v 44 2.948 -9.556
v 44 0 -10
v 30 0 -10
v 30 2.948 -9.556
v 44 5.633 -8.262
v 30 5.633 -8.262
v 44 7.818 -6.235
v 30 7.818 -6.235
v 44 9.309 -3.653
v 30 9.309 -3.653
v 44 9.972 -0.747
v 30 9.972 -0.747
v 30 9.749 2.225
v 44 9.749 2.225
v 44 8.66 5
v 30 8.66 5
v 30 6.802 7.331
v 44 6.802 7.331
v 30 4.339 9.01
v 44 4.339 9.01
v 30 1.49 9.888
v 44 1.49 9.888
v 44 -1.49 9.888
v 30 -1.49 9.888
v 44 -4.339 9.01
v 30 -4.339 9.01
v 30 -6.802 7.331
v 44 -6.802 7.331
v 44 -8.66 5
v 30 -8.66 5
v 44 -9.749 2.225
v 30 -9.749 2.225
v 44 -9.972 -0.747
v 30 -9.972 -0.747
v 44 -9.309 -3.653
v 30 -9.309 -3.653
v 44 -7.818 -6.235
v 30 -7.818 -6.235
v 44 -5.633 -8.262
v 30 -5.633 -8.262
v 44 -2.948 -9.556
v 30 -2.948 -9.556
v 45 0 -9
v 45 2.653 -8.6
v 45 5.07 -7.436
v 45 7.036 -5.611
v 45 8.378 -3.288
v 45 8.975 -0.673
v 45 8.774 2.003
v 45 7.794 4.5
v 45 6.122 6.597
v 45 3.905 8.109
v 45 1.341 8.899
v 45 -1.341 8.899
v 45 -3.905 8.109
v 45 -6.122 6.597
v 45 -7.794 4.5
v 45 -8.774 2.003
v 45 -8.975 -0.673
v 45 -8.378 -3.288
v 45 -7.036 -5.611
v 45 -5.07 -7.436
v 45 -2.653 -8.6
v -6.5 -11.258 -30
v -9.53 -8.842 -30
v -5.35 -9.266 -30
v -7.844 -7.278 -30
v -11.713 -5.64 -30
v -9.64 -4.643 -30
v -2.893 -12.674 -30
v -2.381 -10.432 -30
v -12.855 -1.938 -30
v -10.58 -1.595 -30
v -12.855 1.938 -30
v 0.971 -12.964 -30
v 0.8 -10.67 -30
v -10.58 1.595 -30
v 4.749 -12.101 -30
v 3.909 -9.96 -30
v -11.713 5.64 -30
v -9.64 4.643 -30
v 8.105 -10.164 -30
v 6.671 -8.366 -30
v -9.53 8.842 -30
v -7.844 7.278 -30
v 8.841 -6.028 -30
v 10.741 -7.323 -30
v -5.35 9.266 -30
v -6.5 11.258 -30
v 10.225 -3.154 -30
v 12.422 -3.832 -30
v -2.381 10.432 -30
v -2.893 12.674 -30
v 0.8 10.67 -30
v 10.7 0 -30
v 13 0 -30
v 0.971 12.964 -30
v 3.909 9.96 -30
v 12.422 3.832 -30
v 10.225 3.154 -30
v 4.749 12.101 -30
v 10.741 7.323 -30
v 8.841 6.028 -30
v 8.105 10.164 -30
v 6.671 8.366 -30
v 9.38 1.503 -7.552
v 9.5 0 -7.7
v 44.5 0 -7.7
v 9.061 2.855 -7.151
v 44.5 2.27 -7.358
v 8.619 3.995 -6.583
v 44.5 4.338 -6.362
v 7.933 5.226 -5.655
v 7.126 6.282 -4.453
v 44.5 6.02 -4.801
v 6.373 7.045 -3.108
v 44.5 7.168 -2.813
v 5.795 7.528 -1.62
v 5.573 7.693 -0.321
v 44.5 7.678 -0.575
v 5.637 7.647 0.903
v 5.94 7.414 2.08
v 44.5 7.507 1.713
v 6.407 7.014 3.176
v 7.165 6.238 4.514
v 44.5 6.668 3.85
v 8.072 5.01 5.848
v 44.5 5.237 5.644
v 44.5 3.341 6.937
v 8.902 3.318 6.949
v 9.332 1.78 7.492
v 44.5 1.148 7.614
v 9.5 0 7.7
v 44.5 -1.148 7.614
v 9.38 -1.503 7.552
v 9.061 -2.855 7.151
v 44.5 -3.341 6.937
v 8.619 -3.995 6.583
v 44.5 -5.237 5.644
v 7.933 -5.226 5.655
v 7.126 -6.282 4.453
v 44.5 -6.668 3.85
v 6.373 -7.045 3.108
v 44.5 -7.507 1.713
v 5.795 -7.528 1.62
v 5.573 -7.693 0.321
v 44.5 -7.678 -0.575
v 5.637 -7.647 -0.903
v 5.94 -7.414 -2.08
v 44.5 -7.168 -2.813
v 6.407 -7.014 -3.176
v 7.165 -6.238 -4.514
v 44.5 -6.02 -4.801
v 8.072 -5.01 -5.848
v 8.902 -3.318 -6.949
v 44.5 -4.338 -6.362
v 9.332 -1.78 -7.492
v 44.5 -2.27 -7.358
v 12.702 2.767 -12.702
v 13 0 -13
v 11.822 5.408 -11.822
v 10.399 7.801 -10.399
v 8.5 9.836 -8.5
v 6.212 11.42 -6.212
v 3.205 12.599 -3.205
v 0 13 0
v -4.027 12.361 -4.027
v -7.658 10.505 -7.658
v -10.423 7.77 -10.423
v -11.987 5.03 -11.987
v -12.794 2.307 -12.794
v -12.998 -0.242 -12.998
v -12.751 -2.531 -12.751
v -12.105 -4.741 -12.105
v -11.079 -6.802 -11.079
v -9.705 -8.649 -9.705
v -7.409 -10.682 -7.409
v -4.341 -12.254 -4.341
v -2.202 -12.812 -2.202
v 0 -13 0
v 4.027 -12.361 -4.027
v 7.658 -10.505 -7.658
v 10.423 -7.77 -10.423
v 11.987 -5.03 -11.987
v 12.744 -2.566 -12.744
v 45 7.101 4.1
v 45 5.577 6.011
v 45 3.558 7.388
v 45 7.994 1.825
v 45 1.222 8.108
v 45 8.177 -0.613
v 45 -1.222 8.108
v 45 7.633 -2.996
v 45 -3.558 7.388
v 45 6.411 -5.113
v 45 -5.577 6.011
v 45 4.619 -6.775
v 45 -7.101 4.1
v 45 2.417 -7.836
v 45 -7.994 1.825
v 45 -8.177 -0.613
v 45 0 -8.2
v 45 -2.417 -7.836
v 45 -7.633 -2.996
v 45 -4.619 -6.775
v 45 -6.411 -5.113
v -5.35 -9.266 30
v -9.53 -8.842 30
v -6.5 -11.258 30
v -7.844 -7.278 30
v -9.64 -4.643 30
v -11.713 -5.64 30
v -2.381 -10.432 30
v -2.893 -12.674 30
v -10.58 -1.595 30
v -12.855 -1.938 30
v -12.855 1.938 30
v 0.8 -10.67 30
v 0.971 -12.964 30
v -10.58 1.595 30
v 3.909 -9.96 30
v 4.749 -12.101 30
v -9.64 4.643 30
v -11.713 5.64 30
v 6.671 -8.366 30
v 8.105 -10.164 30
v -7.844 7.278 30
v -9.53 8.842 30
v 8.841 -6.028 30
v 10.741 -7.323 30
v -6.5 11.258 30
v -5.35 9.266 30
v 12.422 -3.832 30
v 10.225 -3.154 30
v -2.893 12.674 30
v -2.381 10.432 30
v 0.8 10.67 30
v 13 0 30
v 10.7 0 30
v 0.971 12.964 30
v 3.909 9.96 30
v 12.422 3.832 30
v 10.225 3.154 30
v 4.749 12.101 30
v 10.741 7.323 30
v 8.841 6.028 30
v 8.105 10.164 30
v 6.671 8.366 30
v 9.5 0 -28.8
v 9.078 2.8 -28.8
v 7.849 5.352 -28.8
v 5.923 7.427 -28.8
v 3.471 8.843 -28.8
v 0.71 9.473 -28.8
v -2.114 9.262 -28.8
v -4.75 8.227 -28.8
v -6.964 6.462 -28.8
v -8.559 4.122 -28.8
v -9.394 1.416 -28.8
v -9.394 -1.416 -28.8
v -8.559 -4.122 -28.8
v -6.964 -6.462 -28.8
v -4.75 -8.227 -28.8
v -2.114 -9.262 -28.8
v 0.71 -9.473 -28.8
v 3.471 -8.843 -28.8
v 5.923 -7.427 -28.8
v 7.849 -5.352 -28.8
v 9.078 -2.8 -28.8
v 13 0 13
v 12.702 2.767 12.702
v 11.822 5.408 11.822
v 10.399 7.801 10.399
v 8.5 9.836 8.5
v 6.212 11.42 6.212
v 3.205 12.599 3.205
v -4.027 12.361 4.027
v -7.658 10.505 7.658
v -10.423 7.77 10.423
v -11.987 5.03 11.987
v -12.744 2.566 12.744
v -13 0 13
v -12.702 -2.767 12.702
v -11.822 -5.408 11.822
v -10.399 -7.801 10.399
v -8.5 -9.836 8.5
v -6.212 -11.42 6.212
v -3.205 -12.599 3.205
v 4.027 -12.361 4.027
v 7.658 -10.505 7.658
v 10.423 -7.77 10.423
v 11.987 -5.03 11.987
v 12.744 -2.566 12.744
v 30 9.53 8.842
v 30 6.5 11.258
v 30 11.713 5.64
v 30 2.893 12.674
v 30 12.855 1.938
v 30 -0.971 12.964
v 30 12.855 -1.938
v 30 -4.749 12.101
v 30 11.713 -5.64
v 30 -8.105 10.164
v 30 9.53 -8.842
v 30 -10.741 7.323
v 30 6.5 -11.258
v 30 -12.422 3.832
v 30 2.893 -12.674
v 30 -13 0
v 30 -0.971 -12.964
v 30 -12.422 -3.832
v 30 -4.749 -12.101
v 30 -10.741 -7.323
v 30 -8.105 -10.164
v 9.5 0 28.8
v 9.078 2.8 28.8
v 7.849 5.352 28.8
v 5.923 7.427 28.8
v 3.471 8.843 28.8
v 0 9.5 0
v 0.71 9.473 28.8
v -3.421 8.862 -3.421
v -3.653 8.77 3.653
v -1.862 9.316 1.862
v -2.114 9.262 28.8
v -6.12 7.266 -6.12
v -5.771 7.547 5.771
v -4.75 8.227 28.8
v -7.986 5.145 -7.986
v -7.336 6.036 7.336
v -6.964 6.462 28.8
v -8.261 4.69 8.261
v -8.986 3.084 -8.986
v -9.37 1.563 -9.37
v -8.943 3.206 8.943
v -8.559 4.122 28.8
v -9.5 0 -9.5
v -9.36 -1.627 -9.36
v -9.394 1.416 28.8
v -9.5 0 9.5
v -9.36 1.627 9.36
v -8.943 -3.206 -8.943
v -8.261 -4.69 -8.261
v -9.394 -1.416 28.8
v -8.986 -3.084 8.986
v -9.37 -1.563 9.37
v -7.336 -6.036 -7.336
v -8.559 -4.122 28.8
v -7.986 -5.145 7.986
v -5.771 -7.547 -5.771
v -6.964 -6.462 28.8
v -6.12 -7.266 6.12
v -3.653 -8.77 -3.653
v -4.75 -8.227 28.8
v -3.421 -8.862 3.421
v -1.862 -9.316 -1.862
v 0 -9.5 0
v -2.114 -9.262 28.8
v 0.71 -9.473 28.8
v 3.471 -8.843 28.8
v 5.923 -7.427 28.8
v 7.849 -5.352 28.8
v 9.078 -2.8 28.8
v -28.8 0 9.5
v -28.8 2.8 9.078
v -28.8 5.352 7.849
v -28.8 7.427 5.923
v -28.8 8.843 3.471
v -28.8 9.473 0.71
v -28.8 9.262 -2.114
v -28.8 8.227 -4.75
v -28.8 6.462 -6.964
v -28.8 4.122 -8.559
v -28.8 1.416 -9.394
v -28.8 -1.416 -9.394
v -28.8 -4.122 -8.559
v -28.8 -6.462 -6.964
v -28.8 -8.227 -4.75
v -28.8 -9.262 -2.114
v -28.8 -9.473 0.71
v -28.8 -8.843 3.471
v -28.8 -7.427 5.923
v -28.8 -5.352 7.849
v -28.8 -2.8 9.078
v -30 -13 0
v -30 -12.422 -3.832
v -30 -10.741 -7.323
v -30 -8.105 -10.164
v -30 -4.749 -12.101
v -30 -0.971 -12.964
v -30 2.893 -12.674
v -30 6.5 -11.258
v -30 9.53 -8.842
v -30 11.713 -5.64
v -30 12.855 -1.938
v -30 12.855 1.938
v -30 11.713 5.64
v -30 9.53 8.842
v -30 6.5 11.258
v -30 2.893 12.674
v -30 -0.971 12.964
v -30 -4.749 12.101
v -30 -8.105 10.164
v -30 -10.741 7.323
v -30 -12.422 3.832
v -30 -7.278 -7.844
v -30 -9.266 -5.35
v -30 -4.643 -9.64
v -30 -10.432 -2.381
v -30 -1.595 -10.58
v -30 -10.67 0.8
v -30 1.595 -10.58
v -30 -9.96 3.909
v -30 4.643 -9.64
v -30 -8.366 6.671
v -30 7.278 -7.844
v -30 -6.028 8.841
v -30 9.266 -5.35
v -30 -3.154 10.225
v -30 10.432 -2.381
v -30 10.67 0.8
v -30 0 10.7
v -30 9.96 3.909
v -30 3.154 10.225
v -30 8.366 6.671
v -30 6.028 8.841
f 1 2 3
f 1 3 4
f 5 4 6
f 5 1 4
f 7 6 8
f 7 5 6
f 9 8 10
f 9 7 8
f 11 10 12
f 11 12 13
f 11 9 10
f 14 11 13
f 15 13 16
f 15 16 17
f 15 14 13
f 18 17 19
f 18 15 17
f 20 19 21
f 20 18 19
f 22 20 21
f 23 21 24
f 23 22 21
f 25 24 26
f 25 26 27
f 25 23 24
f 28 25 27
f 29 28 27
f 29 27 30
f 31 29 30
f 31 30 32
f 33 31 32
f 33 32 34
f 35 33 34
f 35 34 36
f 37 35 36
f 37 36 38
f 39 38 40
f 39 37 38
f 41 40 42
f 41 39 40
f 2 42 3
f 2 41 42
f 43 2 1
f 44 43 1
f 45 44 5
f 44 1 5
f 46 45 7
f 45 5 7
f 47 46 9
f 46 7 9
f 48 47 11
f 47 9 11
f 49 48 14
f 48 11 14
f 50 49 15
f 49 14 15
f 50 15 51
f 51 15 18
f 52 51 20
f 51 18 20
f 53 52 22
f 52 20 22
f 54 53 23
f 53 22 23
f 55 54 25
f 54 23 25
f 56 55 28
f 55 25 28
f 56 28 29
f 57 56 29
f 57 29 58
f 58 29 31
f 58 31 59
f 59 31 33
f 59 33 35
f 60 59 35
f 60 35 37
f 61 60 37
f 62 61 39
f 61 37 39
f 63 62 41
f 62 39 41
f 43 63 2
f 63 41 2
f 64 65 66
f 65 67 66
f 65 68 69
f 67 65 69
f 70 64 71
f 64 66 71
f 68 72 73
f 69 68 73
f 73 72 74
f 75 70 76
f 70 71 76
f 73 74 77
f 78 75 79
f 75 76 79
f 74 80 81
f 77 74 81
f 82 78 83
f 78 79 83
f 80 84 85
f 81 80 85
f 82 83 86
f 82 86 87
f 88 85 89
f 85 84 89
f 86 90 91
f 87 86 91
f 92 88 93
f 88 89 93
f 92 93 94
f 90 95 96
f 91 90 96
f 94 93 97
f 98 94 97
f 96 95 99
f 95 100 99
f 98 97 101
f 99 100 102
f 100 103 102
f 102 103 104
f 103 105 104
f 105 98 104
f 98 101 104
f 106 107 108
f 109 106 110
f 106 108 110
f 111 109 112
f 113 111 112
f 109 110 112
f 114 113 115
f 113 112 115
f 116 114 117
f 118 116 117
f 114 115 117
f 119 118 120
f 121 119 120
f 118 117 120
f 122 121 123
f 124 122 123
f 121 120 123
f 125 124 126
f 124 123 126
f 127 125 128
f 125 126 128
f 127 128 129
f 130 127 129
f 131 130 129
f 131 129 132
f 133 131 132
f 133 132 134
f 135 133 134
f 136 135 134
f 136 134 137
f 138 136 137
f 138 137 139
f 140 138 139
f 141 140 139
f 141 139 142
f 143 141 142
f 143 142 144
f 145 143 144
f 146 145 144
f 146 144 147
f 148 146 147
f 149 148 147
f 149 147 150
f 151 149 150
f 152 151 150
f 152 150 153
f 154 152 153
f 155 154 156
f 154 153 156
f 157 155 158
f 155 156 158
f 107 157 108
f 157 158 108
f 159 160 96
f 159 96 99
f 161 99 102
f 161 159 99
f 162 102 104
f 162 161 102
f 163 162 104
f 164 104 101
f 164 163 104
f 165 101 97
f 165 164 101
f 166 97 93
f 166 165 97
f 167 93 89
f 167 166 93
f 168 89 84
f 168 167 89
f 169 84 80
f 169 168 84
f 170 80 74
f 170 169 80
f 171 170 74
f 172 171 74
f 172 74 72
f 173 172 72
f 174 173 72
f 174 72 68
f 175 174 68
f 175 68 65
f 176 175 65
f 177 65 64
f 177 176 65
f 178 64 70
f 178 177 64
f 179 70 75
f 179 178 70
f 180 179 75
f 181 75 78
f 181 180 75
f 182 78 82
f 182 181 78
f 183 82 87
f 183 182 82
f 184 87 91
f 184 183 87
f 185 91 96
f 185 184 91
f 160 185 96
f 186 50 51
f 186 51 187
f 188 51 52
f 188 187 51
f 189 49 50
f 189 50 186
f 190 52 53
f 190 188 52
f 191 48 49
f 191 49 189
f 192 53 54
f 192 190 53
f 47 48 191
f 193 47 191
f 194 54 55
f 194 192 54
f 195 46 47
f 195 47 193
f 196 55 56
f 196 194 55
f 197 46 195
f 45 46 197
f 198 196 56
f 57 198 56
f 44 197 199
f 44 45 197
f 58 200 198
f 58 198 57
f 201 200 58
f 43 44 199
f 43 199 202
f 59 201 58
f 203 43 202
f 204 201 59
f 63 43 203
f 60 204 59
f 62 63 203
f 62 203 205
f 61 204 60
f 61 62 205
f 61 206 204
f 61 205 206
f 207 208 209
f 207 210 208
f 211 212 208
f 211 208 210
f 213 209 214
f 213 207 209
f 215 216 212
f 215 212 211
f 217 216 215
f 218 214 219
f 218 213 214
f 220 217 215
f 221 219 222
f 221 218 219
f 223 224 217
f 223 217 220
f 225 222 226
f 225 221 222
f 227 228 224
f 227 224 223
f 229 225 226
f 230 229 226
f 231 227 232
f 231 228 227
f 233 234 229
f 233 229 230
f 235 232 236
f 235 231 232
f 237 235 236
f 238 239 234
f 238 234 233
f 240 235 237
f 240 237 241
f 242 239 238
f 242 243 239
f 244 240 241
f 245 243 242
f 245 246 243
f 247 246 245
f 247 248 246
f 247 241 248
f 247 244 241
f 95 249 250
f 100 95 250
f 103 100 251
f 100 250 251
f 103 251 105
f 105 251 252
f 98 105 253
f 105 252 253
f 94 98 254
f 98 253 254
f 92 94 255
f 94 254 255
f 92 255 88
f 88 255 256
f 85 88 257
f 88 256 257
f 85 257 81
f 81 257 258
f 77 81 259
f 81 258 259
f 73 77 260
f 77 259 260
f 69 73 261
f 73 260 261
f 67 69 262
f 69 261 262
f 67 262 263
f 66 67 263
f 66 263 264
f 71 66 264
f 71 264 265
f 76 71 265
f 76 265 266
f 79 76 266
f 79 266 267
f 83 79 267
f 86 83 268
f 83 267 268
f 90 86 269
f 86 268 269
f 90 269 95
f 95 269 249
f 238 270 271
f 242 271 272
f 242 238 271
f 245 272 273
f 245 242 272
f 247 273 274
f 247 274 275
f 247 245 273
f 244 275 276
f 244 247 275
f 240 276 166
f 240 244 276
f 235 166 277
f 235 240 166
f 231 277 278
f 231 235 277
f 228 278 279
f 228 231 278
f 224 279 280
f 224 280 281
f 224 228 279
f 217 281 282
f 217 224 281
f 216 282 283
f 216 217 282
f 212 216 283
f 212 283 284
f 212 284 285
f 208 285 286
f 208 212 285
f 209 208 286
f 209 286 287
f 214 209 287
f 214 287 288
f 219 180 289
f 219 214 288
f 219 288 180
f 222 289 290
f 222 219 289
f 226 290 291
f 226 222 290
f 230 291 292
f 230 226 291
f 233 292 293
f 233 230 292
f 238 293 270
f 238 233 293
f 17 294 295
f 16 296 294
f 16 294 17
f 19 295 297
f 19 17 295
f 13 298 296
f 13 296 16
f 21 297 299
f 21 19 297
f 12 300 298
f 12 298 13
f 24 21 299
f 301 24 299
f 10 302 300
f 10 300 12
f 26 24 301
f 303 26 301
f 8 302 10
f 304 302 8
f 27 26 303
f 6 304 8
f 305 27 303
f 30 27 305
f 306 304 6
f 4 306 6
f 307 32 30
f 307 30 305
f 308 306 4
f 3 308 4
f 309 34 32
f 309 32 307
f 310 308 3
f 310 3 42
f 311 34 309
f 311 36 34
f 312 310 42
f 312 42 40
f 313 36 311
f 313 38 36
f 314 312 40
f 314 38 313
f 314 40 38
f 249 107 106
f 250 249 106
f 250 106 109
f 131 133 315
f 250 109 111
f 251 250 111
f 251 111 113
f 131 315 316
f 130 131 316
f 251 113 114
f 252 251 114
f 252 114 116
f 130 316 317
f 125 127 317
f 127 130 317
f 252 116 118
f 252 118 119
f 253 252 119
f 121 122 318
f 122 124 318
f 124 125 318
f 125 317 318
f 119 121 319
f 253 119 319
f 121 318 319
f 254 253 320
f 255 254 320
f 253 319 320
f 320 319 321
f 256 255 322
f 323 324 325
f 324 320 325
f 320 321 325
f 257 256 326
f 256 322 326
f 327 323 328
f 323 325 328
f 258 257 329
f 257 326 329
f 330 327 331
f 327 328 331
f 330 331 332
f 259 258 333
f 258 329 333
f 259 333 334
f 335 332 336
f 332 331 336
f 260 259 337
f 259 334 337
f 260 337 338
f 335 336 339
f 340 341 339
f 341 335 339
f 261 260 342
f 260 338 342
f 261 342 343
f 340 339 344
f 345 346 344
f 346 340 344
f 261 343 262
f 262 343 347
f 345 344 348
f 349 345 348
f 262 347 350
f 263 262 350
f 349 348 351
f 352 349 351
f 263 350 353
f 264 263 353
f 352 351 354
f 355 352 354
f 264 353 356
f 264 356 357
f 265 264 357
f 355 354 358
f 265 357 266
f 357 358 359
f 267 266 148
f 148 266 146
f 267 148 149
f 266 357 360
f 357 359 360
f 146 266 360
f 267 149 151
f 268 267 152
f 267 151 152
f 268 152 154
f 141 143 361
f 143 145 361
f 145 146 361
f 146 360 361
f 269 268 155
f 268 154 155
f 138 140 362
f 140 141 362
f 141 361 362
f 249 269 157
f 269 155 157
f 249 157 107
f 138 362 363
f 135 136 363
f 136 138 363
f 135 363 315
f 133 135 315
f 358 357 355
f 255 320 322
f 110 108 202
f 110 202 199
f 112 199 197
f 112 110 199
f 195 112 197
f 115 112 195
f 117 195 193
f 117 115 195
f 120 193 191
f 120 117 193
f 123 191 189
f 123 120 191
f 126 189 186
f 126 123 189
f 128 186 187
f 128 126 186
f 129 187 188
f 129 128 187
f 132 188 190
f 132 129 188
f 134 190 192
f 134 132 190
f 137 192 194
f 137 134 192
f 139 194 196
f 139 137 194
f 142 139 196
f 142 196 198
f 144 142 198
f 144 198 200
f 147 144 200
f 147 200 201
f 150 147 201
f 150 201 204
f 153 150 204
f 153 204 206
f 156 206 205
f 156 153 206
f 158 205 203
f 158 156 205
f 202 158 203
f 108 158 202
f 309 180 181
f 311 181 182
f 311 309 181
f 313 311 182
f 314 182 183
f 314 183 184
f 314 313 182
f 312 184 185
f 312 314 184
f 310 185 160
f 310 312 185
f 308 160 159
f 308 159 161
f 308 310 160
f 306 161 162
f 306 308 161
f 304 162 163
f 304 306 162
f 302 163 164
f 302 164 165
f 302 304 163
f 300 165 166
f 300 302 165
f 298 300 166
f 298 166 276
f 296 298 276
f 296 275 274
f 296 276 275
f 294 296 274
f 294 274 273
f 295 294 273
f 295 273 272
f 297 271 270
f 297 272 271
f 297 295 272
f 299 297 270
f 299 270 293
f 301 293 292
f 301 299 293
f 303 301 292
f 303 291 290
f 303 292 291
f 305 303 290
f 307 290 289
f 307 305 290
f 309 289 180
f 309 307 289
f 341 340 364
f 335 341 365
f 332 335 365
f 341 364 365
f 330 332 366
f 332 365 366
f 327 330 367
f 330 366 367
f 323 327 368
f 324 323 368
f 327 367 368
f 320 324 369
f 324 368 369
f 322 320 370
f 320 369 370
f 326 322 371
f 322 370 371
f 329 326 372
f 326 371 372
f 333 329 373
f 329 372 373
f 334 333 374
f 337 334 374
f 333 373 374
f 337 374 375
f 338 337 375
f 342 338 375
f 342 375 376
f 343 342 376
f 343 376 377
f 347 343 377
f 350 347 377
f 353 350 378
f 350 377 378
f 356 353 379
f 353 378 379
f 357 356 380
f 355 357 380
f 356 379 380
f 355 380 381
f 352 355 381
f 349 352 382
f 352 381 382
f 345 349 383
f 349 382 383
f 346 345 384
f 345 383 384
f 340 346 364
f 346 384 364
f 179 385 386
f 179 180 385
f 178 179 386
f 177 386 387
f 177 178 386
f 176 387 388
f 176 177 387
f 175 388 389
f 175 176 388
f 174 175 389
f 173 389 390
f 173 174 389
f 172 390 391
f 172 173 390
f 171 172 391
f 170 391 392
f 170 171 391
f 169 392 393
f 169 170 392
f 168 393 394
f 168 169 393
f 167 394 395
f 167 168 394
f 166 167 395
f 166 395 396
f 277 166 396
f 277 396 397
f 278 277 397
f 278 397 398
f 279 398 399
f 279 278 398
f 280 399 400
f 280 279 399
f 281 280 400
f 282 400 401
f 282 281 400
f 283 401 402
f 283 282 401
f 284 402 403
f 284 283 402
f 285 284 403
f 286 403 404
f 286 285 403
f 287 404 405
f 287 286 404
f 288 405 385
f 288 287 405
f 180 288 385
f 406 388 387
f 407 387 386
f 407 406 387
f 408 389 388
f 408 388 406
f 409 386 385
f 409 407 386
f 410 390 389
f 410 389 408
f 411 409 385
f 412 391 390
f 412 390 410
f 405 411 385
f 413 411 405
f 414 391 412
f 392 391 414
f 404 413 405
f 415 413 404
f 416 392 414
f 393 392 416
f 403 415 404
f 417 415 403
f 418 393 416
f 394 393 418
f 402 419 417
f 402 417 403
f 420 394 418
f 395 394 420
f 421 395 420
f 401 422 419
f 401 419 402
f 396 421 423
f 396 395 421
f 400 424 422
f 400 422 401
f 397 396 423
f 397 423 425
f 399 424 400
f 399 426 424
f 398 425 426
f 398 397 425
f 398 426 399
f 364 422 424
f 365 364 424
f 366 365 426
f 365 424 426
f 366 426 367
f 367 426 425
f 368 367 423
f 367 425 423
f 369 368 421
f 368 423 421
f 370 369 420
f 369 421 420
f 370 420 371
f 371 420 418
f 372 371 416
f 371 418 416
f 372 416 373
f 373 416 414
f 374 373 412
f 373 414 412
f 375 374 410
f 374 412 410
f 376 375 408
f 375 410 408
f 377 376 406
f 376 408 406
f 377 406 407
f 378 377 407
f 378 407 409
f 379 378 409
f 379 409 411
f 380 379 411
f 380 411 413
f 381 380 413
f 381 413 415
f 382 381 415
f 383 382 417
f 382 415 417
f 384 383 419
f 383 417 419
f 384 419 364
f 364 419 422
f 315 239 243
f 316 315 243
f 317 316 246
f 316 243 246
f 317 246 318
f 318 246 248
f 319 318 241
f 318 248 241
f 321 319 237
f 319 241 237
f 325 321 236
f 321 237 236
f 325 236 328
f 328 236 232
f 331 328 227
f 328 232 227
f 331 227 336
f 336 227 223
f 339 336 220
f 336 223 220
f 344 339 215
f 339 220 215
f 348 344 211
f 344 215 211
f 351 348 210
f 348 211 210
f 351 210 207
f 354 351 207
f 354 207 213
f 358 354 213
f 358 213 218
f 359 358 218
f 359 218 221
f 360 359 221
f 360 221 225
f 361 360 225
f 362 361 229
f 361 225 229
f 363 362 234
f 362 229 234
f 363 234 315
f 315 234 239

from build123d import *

# Parameters (mm, degrees)
SKETCH_1_R               = 13
EXTRUDE_1_DEPTH          = 30
SKETCH_2_R               = 13
EXTRUDE_2_DEPTH          = 45
SKETCH_3_R               = 13
SKETCH_3_R_2             = 10
CUT_EXTRUDE_1_DEPTH      = 15
SKETCH_4_R               = 9.5
CUT_EXTRUDE_2_DEPTH      = 90
CUT_EXTRUDE_3_REACH      = 97.755
CUT_EXTRUDE_3_END_RADIUS = 9.5
SKETCH_5_R               = 7.7
CUT_EXTRUDE_4_REACH      = 97.755
CUT_EXTRUDE_4_END_RADIUS = 9.5
SKETCH_6_R               = 9.5
CUT_EXTRUDE_START        = -15
SKETCH_7_R               = 13
CUT_EXTRUDE_5_DEPTH      = 15
CHAMFER_1_SIZE           = 1.2
CHAMFER_2_SIZE           = 1
CHAMFER_3_SIZE           = 0.5


with BuildPart() as part:
    # 草图1 → 拉伸1 (new, symmetric)
    with BuildSketch(Plane.XY):
        Circle(SKETCH_1_R)
    extrude(amount=EXTRUDE_1_DEPTH, both=True)

    # 草图2 → 拉伸2 (add, symmetric)
    with BuildSketch(Plane(origin=(0, 0, 0), x_dir=(0, 0, -1), z_dir=(1, 0, 0))):
        with Locations(Location((0, 0, 0), (0, 0, 270))):
            Circle(SKETCH_2_R)
    extrude(amount=EXTRUDE_2_DEPTH, both=True)

    # 草图3 → 切除-拉伸1 (cut)
    with BuildSketch(Plane(origin=(45, 0, 0), x_dir=(0, 0, -1), z_dir=(1, 0, 0))):
        with Locations(Location((0, 0, 0), (0, 0, 270))):
            Circle(SKETCH_3_R)
        Circle(SKETCH_3_R_2, mode=Mode.SUBTRACT)
    extrude(amount=-CUT_EXTRUDE_1_DEPTH, mode=Mode.SUBTRACT)

    # 草图4 → 切除-拉伸2 (cut)
    with BuildSketch(Plane.XY.offset(30)):
        Circle(SKETCH_4_R)
    extrude(amount=-CUT_EXTRUDE_2_DEPTH, mode=Mode.SUBTRACT)

    # 切除-拉伸3: up to this cylinder (the profile starts outside it)
    cut_extrude_3_end = Plane(origin=(0, 0, 0), z_dir=(0, 0, 1)) * Cylinder(CUT_EXTRUDE_3_END_RADIUS, 215.51, mode=Mode.PRIVATE)
    # 草图5 → 切除-拉伸3 (cut, up to the surface)
    with BuildSketch(Plane(origin=(45, 0, 0), x_dir=(0, 0, -1), z_dir=(1, 0, 0)), mode=Mode.PRIVATE) as cut_extrude_3_sk1:
        Circle(SKETCH_5_R)
    cut_extrude_3_tool1 = extrude(cut_extrude_3_sk1.sketch, amount=-CUT_EXTRUDE_3_REACH, mode=Mode.PRIVATE) - cut_extrude_3_end
    add(cut_extrude_3_tool1.solids().sort_by_distance((45, 0, 0))[0], mode=Mode.SUBTRACT)

    # 切除-拉伸4: up to this cylinder (the profile starts outside it)
    cut_extrude_4_end = Plane(origin=(0, 0, 0), z_dir=(0, 0, 1)) * Cylinder(CUT_EXTRUDE_4_END_RADIUS, 215.51, mode=Mode.PRIVATE)
    # 草图6 → 切除-拉伸4 (cut, up to the surface)
    with BuildSketch(Plane.ZY.offset(45), mode=Mode.PRIVATE) as cut_extrude_4_sk1:
        Circle(SKETCH_6_R)
    cut_extrude_4_tool1 = extrude(cut_extrude_4_sk1.sketch, amount=-CUT_EXTRUDE_4_REACH, mode=Mode.PRIVATE) - cut_extrude_4_end
    add(cut_extrude_4_tool1.solids().sort_by_distance((-45, 0, 0))[0], mode=Mode.SUBTRACT)

    # 草图7 → 切除-拉伸5 (cut)
    with BuildSketch(Plane.ZY.offset(45).offset(CUT_EXTRUDE_START)):
        Circle(SKETCH_7_R)
    extrude(amount=CUT_EXTRUDE_5_DEPTH, mode=Mode.SUBTRACT)

    # 倒角1
    chamfer_1_edges = [part.edges().sort_by_distance(p)[0] for p in [
        (-9.5, 0, -30),
        (-9.5, 0, 30),
        (-30, 0, -9.5),
    ]]
    chamfer(chamfer_1_edges, length=CHAMFER_1_SIZE)

    # 倒角2
    chamfer_2_edges = [part.edges().sort_by_distance(p)[0] for p in [
        (45, 0, 10),
    ]]
    chamfer(chamfer_2_edges, length=CHAMFER_2_SIZE)

    # 倒角3
    chamfer_3_edges = [part.edges().sort_by_distance(p)[0] for p in [
        (45, 0, 7.7),
    ]]
    chamfer(chamfer_3_edges, length=CHAMFER_3_SIZE)


solid = part.part
